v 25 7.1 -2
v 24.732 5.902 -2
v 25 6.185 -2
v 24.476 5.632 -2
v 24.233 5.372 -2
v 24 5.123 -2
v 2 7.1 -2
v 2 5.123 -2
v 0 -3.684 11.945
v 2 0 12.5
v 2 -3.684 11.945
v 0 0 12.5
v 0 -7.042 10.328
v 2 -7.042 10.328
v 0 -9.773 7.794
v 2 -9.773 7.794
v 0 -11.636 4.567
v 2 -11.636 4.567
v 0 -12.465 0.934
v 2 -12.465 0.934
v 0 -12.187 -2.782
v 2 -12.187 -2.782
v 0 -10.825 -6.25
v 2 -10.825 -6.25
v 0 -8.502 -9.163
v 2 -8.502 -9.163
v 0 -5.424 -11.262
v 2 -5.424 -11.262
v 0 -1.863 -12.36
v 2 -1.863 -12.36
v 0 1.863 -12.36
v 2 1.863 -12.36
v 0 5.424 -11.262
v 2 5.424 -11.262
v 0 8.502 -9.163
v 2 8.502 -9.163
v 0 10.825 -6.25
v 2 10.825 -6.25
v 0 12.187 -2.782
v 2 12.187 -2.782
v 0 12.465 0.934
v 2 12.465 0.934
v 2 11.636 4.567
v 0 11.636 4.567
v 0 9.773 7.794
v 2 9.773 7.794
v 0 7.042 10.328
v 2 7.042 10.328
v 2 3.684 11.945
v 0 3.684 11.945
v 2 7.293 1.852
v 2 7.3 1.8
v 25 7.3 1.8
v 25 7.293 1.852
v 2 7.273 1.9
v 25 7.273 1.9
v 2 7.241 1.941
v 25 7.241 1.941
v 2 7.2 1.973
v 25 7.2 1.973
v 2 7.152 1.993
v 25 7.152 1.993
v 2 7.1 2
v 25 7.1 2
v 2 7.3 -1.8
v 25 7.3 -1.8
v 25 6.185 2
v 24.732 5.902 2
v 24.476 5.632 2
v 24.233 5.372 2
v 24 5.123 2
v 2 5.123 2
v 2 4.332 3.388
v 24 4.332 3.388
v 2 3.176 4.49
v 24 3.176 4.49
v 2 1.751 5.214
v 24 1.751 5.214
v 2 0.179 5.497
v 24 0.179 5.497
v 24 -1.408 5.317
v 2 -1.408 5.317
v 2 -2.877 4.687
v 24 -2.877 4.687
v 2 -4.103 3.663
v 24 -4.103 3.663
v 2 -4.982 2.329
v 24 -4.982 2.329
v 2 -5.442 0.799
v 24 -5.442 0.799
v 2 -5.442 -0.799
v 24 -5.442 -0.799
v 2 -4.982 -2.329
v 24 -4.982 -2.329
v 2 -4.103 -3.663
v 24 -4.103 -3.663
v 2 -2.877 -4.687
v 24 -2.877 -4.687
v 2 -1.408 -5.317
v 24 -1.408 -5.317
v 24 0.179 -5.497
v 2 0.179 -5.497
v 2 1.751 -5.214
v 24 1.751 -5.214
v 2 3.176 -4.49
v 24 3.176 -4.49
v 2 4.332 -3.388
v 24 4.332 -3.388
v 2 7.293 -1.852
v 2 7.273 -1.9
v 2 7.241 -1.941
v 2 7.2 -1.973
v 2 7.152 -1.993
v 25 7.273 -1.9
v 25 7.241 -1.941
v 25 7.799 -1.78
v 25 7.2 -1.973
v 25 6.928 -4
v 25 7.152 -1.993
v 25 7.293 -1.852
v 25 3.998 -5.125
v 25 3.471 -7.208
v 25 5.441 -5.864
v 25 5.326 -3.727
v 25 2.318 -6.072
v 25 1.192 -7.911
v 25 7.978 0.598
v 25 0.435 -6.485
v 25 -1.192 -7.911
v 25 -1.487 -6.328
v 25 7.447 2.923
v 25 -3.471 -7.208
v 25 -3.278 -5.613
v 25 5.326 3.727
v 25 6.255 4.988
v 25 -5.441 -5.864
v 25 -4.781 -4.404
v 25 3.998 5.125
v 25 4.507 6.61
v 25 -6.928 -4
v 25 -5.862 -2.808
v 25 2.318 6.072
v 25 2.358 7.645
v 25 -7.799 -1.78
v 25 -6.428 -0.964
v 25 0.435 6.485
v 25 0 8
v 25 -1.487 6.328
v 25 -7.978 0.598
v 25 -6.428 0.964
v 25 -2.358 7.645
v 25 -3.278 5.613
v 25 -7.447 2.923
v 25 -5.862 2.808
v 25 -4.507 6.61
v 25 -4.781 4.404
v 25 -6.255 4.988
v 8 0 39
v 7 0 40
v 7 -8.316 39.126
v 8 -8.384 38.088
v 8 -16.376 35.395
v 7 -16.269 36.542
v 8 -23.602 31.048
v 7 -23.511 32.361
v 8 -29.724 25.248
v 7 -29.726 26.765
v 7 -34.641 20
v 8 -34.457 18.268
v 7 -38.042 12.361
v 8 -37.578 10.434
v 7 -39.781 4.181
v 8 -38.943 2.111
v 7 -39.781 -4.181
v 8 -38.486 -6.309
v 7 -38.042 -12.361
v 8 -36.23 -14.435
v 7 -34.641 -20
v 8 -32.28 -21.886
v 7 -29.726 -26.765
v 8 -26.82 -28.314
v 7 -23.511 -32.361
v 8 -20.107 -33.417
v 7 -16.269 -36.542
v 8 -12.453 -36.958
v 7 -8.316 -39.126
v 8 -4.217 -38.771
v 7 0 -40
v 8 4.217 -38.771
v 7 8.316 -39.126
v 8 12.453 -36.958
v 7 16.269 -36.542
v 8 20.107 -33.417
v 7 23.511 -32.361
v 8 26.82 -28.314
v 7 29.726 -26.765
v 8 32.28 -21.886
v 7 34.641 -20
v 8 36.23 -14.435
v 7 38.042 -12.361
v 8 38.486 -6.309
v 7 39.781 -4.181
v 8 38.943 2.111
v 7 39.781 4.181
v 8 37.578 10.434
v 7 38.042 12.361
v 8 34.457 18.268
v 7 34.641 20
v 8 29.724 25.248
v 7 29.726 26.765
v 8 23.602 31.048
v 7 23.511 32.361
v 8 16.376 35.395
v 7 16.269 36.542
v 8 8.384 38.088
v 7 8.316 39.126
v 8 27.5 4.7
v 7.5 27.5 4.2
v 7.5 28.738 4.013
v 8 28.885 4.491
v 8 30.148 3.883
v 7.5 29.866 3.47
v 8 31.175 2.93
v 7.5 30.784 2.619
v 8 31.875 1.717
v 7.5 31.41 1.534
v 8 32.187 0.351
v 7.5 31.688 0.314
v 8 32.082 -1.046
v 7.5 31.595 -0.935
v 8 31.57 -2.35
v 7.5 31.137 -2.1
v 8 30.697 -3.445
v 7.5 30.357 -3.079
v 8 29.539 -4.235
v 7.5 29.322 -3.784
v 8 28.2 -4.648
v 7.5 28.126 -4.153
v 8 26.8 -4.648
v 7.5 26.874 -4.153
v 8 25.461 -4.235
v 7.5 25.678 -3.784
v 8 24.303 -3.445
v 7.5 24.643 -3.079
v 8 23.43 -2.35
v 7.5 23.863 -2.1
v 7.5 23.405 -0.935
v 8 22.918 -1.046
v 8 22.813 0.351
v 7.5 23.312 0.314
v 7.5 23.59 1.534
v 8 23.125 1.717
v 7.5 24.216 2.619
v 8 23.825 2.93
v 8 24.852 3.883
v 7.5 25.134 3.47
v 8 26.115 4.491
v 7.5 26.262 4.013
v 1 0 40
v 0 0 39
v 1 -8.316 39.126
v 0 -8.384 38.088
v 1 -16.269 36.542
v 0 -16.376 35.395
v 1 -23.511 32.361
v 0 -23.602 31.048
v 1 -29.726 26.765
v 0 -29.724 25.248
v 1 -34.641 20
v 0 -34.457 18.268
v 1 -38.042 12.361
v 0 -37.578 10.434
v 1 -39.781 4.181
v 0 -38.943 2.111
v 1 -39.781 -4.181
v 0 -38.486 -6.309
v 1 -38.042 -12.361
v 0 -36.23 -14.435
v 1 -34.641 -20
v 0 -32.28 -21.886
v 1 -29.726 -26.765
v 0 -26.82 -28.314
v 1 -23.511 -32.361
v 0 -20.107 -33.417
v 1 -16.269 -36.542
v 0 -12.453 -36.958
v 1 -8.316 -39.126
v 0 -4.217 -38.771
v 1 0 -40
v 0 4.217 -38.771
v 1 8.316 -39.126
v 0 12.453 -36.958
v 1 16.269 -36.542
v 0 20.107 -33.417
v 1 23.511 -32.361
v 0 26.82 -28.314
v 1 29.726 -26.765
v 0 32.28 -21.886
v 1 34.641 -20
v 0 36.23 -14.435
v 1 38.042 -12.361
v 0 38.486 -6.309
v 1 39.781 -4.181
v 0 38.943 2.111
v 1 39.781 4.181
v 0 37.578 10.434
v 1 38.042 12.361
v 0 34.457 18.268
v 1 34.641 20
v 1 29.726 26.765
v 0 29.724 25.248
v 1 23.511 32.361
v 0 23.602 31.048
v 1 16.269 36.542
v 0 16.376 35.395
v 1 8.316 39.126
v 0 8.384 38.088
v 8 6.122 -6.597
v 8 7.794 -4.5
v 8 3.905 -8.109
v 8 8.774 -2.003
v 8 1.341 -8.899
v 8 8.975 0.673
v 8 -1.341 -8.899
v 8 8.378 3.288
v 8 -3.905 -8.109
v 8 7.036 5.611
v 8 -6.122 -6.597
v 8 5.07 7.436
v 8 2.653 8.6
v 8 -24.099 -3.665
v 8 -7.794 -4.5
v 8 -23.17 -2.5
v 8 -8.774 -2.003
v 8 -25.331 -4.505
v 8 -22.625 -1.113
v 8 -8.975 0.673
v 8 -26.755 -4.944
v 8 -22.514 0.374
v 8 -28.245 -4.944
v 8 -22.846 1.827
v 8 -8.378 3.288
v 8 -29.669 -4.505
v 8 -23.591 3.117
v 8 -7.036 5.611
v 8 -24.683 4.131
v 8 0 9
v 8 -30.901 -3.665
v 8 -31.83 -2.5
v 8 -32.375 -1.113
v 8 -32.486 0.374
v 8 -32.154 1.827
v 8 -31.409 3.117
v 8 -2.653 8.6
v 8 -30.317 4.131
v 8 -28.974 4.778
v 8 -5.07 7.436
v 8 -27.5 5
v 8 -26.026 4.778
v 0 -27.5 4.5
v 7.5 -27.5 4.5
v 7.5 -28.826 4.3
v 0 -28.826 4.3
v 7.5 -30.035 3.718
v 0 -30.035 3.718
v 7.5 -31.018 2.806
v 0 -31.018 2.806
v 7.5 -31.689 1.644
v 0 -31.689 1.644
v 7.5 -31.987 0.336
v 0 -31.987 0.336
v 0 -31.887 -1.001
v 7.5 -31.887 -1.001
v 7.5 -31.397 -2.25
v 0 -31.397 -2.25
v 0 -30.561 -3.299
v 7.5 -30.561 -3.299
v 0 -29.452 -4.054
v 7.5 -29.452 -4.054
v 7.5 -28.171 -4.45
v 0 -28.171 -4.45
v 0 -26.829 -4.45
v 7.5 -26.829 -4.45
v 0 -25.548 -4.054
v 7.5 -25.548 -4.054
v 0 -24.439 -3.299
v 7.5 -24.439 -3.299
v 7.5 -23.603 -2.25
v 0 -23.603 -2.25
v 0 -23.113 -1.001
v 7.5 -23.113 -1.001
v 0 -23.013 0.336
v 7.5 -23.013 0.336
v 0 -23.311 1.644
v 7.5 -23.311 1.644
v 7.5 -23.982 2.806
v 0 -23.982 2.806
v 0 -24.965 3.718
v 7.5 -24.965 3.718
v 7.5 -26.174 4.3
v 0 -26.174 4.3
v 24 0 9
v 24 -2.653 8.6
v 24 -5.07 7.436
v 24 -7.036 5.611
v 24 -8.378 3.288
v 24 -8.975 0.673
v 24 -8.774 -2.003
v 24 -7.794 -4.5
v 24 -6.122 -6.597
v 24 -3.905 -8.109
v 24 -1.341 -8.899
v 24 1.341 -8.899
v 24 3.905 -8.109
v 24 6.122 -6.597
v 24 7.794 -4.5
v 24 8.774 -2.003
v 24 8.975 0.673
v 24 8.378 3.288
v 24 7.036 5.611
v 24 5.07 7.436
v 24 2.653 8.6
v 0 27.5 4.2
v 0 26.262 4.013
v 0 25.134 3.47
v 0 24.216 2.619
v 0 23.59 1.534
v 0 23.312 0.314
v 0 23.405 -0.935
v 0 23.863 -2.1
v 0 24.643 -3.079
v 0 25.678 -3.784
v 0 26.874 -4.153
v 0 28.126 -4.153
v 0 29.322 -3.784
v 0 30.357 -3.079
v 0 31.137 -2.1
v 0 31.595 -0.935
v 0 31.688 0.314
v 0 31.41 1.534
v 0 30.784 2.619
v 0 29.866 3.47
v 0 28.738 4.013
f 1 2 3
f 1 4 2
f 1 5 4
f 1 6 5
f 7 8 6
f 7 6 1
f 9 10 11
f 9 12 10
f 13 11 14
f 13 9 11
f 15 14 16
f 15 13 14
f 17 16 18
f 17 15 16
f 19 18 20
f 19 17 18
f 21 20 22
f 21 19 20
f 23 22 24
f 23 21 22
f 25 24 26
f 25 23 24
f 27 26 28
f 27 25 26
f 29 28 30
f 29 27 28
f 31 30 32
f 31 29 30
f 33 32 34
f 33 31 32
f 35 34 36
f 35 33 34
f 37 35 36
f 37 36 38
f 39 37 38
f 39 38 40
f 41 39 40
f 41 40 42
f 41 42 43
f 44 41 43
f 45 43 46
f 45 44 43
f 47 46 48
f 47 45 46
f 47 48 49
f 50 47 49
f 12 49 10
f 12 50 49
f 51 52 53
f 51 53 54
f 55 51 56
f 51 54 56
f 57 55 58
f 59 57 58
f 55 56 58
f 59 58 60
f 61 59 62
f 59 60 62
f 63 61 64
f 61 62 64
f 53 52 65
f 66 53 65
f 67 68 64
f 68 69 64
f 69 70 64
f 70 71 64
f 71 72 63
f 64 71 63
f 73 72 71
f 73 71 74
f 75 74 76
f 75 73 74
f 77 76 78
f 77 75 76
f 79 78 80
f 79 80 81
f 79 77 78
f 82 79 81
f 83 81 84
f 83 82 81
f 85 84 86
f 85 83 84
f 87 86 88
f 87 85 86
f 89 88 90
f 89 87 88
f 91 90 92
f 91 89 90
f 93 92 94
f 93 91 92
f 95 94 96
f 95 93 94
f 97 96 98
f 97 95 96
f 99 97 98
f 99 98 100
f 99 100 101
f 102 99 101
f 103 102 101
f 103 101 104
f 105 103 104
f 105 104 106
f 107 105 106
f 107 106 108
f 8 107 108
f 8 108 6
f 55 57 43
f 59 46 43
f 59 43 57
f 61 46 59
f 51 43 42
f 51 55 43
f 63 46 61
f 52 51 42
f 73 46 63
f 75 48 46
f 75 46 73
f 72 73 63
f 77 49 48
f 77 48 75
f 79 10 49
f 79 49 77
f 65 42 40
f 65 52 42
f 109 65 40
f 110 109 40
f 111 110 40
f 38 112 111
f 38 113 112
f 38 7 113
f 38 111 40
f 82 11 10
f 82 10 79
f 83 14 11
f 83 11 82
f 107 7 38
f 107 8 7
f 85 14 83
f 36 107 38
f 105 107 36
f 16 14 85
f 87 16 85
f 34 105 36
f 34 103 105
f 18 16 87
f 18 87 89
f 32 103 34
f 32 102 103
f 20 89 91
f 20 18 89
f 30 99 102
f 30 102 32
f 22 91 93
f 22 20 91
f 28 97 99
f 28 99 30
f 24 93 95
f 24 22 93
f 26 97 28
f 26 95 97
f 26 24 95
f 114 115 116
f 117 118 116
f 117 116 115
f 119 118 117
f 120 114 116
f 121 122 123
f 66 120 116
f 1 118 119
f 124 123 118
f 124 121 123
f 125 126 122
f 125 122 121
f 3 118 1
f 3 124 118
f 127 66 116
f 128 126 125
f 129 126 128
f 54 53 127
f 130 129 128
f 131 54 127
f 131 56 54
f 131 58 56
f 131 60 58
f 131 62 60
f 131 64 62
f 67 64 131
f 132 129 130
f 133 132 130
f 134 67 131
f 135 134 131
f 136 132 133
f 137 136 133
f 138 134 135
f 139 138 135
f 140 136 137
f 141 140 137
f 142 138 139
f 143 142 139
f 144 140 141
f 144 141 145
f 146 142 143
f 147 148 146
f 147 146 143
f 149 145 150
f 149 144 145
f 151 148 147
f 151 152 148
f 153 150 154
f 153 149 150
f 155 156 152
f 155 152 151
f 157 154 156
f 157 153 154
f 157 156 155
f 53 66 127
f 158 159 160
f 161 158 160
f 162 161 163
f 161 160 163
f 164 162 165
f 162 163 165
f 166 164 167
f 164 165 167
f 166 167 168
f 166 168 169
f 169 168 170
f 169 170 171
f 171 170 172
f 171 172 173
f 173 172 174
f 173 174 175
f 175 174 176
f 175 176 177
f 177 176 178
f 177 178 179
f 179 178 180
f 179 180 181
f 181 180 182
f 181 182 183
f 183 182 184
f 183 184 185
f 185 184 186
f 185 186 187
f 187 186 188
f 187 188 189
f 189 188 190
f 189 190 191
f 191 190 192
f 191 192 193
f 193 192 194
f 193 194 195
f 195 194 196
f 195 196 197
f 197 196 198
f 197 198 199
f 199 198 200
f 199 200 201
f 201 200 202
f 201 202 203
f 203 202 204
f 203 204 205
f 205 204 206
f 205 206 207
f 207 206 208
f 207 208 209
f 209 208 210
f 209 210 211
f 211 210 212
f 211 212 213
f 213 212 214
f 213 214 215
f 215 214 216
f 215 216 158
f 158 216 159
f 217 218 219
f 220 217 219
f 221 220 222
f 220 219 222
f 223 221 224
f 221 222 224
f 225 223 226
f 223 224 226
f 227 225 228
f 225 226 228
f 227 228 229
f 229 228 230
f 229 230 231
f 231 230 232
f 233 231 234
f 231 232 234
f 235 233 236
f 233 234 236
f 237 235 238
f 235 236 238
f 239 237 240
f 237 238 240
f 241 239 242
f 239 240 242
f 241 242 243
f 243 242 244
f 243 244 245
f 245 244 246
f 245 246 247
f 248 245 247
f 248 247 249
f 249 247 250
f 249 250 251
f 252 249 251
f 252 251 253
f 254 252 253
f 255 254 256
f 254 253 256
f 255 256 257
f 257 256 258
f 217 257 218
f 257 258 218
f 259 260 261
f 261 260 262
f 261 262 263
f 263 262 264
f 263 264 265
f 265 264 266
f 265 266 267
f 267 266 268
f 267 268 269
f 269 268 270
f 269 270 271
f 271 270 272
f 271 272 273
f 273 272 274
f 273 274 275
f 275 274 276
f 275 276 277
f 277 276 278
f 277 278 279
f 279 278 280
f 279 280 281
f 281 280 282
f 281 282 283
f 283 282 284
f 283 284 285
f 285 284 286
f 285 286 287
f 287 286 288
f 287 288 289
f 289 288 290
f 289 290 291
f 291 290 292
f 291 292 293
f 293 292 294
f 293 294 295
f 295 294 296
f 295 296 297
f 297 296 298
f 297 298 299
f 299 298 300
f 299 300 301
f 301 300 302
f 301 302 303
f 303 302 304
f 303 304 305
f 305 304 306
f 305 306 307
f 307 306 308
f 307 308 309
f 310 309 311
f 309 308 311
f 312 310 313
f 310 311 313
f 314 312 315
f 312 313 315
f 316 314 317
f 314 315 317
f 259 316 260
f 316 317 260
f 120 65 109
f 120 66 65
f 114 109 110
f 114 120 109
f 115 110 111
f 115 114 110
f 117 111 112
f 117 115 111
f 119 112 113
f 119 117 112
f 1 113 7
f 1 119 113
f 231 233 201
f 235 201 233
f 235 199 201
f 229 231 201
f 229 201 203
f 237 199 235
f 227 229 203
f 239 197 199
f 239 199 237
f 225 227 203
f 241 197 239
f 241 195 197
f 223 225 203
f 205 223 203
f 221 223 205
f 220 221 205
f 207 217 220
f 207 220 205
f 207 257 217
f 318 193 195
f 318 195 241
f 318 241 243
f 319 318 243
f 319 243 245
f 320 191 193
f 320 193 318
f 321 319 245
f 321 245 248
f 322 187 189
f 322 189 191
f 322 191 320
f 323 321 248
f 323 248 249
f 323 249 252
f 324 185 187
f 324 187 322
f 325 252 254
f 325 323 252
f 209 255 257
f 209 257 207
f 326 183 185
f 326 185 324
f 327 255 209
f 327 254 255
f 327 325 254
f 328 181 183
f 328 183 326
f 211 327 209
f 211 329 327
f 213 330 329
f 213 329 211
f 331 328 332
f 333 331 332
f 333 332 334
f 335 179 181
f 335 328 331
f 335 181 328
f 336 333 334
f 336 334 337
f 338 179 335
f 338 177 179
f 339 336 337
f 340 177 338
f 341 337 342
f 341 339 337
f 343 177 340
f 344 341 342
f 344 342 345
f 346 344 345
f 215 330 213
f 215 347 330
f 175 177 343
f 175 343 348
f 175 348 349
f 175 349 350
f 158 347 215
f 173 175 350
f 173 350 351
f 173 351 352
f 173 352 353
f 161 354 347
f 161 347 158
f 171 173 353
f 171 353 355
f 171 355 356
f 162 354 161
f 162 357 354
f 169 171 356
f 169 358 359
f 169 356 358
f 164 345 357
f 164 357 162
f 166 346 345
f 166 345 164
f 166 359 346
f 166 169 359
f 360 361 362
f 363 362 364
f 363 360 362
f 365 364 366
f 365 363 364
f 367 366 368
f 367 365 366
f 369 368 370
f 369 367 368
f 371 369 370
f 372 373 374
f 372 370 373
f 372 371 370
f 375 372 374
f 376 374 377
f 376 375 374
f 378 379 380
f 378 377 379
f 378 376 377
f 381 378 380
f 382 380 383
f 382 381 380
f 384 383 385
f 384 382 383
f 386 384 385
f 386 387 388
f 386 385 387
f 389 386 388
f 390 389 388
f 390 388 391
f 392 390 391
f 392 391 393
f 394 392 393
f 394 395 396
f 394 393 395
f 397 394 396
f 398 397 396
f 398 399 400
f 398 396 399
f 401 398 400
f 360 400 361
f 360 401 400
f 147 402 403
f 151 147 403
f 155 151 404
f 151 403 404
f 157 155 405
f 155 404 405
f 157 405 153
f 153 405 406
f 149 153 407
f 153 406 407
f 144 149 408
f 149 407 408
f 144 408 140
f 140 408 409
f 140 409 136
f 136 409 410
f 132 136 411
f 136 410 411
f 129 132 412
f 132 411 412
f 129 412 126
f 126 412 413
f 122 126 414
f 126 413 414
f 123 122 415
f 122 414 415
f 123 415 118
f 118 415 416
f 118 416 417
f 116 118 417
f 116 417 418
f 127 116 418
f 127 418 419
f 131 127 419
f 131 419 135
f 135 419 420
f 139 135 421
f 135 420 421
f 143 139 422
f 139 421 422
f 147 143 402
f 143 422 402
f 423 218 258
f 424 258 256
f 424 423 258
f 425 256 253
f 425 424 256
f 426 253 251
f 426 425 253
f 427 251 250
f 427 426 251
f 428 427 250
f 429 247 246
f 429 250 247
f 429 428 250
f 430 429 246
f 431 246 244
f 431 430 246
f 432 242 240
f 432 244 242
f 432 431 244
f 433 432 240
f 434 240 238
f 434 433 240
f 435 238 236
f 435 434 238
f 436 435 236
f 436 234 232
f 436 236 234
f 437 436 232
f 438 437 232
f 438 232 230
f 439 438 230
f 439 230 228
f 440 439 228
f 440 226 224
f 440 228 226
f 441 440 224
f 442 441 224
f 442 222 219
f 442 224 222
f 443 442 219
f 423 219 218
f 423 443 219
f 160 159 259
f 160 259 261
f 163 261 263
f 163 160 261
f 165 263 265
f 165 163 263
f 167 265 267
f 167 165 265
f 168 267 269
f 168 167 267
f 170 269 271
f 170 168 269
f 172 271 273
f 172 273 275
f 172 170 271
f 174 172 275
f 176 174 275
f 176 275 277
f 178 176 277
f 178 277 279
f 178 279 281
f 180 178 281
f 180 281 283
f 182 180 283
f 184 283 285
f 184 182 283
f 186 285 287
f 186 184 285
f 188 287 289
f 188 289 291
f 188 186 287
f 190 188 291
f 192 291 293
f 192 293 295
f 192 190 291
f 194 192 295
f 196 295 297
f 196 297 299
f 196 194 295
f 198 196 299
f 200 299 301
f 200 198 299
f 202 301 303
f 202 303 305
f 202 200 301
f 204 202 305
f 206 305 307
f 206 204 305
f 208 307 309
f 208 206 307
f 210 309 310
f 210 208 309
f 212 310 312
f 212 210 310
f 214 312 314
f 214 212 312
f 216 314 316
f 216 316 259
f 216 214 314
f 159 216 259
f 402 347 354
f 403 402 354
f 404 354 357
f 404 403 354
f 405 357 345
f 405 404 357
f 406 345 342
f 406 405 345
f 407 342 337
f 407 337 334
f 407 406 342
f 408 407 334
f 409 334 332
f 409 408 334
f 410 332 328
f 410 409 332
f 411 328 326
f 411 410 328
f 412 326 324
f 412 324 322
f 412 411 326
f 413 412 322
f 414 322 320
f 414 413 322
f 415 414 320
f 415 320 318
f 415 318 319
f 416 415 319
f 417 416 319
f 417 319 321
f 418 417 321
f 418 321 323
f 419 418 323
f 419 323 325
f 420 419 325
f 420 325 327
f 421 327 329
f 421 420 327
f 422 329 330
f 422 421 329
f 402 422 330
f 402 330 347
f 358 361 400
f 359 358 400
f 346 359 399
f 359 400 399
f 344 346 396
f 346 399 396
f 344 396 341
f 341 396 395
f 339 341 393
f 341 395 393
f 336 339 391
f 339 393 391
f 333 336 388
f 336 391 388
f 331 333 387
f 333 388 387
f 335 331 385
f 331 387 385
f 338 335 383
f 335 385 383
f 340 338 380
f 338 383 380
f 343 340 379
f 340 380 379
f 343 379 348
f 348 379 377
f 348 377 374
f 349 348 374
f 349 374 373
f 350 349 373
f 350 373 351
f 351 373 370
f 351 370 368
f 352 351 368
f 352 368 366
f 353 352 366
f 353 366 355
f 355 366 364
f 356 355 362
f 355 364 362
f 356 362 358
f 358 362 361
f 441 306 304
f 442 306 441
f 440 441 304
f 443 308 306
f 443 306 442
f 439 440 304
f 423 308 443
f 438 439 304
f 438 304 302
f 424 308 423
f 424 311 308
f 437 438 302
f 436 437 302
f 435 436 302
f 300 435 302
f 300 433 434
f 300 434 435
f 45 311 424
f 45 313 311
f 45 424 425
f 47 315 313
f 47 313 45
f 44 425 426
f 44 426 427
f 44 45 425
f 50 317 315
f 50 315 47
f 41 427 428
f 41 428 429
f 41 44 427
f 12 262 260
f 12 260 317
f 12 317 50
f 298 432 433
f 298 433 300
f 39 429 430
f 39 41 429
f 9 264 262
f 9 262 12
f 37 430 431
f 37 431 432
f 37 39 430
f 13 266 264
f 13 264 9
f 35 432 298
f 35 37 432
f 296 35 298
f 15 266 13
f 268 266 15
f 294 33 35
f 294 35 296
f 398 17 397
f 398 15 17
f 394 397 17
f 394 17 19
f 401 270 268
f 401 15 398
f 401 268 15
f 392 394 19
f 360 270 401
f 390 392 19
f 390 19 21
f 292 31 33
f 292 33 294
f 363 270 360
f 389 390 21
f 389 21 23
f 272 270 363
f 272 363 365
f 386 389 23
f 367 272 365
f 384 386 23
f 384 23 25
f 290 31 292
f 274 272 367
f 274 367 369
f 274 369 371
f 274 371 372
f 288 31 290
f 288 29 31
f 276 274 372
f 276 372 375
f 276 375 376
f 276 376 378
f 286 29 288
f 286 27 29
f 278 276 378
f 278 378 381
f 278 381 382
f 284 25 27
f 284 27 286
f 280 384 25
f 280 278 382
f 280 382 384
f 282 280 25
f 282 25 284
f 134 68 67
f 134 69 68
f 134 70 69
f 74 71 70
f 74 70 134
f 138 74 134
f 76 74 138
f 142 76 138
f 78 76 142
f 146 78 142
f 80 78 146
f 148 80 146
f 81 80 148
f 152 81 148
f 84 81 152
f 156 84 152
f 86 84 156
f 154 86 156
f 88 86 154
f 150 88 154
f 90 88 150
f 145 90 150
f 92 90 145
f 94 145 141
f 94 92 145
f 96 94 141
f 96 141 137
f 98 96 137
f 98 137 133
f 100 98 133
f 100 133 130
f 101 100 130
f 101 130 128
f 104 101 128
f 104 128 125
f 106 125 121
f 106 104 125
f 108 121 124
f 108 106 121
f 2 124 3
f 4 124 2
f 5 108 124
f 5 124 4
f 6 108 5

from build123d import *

# Parameters (mm, degrees)
SKETCH_2_R          = 4.2
CUT_EXTRUDE_1_DEPTH = 62.846584384
SKETCH_3_R          = 4.5
CUT_EXTRUDE_2_DEPTH = 62.846584384
SKETCH_5_W          = 4
SKETCH_5_H          = 4
CUT_EXTRUDE_3_DEPTH = 62.846584384
FILLET_1_R          = 0.2
CHAMFER_1_SIZE      = 1
CHAMFER_2_SIZE      = 0.5


with BuildPart() as part:
    # Эскиз1 → Повернуть1 (revolve)
    with BuildSketch(Plane.XY, mode=Mode.PRIVATE) as revolve_1_sk:
        Polygon((0, 12.5), (0, 40), (8, 40), (8, 9), (25, 9), (25, 5.5), (2, 5.5), (2, 12.5), align=None)
    revolve(revolve_1_sk.sketch.rotate(Axis((0, 0, 0), (1, 0, 0)), 90), axis=Axis((0, 0, 0), (1, 0, 0)))

    # Эскиз2 → Вырез-Вытянуть1 (cut, through all)
    with BuildSketch(Plane(origin=(0, 0, 0), x_dir=(0, 0, -1), z_dir=(1, 0, 0))):
        with Locations(Location((0, 27.5, 0), (0, 0, 180))):
            Circle(SKETCH_2_R)
    extrude(amount=CUT_EXTRUDE_1_DEPTH, mode=Mode.SUBTRACT)

    # Эскиз3 → Вырез-Вытянуть2 (cut, through all)
    with BuildSketch(Plane(origin=(0, 0, 0), x_dir=(0, 0, -1), z_dir=(1, 0, 0))):
        with Locations(Location((0, -27.5, 0), (0, 0, 180))):
            Circle(SKETCH_3_R)
    extrude(amount=CUT_EXTRUDE_2_DEPTH, mode=Mode.SUBTRACT)

    # Эскиз5 → Вырез-Вытянуть3 (cut, through all)
    with BuildSketch(Plane(origin=(0, 0, 0), x_dir=(0, 0, -1), z_dir=(1, 0, 0))):
        with Locations((0, 5.3)):
            Rectangle(SKETCH_5_W, SKETCH_5_H)
    extrude(amount=CUT_EXTRUDE_3_DEPTH, mode=Mode.SUBTRACT)

    # Скругление1
    fillet_1_edges = [part.edges().sort_by_distance(p)[0] for p in [
        (13.5, 7.3, -2),
        (13.5, 7.3, 2),
    ]]
    fillet(fillet_1_edges, radius=FILLET_1_R)

    # Фаска1
    chamfer_1_edges = [part.edges().sort_by_distance(p)[0] for p in [
        (25, -5.5, 0),
        (25, 0, -9),
        (8, 0, -40),
        (0, 0, -40),
    ]]
    chamfer(chamfer_1_edges, length=CHAMFER_1_SIZE)

    # Фаска2
    chamfer_2_edges = [part.edges().sort_by_distance(p)[0] for p in [
        (8, 27.5, -4.2),
        (8, -27.5, -4.5),
    ]]
    chamfer(chamfer_2_edges, length=CHAMFER_2_SIZE)


solid = part.part
